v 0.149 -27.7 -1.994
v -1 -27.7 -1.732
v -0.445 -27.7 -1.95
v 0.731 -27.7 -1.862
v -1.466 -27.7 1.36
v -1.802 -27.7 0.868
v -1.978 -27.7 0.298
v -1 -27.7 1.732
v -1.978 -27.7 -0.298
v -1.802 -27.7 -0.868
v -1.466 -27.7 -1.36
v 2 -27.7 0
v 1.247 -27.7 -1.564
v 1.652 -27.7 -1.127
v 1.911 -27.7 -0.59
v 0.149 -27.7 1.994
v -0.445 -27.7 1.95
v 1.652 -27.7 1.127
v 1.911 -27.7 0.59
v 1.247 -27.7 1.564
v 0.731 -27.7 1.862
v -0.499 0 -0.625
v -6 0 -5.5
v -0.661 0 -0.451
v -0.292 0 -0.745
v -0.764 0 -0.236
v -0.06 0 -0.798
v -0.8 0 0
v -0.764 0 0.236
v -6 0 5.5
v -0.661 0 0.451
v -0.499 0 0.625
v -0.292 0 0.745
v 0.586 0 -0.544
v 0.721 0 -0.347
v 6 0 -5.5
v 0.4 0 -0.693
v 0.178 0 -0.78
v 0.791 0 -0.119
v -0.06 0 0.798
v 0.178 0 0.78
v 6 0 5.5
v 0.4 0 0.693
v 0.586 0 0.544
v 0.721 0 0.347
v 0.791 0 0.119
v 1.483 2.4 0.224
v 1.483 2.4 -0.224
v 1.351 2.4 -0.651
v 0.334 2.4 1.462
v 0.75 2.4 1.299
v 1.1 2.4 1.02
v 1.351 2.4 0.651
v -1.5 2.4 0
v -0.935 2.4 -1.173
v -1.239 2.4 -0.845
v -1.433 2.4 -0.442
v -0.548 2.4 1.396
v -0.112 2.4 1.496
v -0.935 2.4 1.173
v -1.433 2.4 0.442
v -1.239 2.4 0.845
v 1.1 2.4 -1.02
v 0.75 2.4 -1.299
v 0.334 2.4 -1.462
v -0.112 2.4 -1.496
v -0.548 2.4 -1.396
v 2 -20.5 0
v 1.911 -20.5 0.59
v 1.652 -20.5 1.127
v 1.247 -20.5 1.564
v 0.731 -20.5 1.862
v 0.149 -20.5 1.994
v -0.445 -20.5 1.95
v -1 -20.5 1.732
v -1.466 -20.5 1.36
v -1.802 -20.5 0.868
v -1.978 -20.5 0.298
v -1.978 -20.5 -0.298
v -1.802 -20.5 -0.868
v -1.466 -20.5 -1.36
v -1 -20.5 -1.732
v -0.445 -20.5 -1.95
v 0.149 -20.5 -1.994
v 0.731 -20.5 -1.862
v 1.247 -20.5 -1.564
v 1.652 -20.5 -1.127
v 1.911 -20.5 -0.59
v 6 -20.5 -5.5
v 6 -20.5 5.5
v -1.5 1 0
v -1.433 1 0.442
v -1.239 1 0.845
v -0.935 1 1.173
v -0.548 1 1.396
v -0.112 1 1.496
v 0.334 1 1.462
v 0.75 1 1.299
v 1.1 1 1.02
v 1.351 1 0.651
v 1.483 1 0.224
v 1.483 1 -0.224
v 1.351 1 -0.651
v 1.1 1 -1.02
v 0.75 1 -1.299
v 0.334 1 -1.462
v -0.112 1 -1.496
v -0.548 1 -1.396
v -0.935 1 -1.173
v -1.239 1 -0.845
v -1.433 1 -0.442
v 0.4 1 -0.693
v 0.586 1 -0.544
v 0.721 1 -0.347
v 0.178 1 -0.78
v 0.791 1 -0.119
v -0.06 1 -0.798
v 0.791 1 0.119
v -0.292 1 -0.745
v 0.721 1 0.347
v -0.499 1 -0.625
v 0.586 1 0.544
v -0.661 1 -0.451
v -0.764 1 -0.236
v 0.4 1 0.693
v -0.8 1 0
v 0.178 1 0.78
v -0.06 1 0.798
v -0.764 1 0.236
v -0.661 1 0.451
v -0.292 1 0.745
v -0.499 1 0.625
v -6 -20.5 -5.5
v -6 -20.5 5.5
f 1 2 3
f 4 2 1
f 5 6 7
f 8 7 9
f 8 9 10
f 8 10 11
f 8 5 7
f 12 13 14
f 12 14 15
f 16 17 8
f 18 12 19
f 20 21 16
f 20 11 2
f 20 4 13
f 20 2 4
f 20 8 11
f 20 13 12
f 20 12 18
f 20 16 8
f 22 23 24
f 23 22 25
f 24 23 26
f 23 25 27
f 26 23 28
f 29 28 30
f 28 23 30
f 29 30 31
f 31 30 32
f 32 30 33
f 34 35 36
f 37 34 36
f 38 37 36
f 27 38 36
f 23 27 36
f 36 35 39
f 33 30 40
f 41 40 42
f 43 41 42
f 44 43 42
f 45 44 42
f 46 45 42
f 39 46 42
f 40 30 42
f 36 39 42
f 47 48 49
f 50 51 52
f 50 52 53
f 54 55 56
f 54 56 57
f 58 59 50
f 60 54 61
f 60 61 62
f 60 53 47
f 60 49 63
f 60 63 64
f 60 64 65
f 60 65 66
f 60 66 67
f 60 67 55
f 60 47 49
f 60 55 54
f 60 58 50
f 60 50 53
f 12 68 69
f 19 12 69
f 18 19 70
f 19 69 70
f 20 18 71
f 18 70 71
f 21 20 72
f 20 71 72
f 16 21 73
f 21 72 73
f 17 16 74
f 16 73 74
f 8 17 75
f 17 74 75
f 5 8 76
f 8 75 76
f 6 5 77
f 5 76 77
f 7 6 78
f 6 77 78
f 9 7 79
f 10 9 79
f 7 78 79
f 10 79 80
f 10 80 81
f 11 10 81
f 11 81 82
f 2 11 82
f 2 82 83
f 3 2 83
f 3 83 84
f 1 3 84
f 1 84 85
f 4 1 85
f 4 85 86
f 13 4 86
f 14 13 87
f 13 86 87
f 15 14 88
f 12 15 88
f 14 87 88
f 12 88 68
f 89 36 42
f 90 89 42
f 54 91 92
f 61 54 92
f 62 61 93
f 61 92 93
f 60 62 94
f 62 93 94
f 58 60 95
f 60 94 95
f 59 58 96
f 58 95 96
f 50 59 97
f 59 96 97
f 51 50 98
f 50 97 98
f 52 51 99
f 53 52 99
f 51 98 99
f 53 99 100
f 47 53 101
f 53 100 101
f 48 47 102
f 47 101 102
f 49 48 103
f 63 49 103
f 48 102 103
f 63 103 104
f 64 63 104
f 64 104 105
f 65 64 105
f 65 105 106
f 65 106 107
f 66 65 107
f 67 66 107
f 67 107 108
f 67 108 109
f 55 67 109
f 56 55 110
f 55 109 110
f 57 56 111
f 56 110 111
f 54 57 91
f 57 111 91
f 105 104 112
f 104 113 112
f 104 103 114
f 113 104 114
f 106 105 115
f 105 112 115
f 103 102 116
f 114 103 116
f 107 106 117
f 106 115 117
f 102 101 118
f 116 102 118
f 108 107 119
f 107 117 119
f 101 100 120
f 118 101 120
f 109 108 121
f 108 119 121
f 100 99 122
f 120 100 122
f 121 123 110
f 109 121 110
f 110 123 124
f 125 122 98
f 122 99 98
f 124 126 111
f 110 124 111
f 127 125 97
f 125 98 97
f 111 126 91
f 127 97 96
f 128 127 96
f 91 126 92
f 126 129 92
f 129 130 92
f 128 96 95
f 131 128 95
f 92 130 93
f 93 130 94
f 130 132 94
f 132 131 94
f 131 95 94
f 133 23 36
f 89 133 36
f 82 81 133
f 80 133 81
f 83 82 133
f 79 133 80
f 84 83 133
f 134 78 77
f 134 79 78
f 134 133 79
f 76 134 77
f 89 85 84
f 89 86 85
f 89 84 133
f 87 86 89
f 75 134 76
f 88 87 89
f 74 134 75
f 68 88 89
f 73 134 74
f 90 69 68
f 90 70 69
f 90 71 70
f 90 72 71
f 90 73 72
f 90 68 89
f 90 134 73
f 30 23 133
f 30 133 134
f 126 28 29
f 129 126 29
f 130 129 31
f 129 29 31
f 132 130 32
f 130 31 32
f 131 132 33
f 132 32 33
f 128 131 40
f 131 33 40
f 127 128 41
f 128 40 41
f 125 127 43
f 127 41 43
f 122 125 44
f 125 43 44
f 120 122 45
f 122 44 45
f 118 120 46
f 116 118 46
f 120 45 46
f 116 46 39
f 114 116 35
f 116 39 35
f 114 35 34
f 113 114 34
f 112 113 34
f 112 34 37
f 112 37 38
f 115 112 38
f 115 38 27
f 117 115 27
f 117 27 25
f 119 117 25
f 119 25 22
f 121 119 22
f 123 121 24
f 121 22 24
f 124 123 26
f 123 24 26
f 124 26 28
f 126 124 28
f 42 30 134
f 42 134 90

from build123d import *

# Parameters (mm, degrees)
F0_W     = 12
F0_H     = 11
F1_DEPTH = 20.5
F2_R     = 2
F3_DEPTH = 7.2
F4_R     = 0.8
F5_DEPTH = 1
F6_R     = 1.5
F6_R_2   = 0.8
F7_DEPTH = 1.4


with BuildPart() as f1:
    # F0 (on Front) → F1 (new body)
    with BuildSketch(Plane.XZ):
        Rectangle(F0_W, F0_H)
    extrude(amount=F1_DEPTH)

    # F2 (on face) → F3 (join)
    with BuildSketch(Plane.XZ.offset(20.5)):
        Circle(F2_R)
    extrude(amount=F3_DEPTH)

    # F4 (on face) → F5 (join)
    with BuildSketch(Plane(origin=(0, 0, 0), x_dir=(-1, 0, 0), z_dir=(0, 1, 0))):
        Circle(F4_R)
    extrude(amount=F5_DEPTH)

    # F6 (on face) → F7 (join)
    with BuildSketch(Plane(origin=(0, 1, 0), x_dir=(-1, 0, 0), z_dir=(0, 1, 0))):
        Circle(F6_R)
        Circle(F6_R_2, mode=Mode.SUBTRACT)
        Circle(F6_R_2)
    extrude(amount=F7_DEPTH)


solid = f1.part
